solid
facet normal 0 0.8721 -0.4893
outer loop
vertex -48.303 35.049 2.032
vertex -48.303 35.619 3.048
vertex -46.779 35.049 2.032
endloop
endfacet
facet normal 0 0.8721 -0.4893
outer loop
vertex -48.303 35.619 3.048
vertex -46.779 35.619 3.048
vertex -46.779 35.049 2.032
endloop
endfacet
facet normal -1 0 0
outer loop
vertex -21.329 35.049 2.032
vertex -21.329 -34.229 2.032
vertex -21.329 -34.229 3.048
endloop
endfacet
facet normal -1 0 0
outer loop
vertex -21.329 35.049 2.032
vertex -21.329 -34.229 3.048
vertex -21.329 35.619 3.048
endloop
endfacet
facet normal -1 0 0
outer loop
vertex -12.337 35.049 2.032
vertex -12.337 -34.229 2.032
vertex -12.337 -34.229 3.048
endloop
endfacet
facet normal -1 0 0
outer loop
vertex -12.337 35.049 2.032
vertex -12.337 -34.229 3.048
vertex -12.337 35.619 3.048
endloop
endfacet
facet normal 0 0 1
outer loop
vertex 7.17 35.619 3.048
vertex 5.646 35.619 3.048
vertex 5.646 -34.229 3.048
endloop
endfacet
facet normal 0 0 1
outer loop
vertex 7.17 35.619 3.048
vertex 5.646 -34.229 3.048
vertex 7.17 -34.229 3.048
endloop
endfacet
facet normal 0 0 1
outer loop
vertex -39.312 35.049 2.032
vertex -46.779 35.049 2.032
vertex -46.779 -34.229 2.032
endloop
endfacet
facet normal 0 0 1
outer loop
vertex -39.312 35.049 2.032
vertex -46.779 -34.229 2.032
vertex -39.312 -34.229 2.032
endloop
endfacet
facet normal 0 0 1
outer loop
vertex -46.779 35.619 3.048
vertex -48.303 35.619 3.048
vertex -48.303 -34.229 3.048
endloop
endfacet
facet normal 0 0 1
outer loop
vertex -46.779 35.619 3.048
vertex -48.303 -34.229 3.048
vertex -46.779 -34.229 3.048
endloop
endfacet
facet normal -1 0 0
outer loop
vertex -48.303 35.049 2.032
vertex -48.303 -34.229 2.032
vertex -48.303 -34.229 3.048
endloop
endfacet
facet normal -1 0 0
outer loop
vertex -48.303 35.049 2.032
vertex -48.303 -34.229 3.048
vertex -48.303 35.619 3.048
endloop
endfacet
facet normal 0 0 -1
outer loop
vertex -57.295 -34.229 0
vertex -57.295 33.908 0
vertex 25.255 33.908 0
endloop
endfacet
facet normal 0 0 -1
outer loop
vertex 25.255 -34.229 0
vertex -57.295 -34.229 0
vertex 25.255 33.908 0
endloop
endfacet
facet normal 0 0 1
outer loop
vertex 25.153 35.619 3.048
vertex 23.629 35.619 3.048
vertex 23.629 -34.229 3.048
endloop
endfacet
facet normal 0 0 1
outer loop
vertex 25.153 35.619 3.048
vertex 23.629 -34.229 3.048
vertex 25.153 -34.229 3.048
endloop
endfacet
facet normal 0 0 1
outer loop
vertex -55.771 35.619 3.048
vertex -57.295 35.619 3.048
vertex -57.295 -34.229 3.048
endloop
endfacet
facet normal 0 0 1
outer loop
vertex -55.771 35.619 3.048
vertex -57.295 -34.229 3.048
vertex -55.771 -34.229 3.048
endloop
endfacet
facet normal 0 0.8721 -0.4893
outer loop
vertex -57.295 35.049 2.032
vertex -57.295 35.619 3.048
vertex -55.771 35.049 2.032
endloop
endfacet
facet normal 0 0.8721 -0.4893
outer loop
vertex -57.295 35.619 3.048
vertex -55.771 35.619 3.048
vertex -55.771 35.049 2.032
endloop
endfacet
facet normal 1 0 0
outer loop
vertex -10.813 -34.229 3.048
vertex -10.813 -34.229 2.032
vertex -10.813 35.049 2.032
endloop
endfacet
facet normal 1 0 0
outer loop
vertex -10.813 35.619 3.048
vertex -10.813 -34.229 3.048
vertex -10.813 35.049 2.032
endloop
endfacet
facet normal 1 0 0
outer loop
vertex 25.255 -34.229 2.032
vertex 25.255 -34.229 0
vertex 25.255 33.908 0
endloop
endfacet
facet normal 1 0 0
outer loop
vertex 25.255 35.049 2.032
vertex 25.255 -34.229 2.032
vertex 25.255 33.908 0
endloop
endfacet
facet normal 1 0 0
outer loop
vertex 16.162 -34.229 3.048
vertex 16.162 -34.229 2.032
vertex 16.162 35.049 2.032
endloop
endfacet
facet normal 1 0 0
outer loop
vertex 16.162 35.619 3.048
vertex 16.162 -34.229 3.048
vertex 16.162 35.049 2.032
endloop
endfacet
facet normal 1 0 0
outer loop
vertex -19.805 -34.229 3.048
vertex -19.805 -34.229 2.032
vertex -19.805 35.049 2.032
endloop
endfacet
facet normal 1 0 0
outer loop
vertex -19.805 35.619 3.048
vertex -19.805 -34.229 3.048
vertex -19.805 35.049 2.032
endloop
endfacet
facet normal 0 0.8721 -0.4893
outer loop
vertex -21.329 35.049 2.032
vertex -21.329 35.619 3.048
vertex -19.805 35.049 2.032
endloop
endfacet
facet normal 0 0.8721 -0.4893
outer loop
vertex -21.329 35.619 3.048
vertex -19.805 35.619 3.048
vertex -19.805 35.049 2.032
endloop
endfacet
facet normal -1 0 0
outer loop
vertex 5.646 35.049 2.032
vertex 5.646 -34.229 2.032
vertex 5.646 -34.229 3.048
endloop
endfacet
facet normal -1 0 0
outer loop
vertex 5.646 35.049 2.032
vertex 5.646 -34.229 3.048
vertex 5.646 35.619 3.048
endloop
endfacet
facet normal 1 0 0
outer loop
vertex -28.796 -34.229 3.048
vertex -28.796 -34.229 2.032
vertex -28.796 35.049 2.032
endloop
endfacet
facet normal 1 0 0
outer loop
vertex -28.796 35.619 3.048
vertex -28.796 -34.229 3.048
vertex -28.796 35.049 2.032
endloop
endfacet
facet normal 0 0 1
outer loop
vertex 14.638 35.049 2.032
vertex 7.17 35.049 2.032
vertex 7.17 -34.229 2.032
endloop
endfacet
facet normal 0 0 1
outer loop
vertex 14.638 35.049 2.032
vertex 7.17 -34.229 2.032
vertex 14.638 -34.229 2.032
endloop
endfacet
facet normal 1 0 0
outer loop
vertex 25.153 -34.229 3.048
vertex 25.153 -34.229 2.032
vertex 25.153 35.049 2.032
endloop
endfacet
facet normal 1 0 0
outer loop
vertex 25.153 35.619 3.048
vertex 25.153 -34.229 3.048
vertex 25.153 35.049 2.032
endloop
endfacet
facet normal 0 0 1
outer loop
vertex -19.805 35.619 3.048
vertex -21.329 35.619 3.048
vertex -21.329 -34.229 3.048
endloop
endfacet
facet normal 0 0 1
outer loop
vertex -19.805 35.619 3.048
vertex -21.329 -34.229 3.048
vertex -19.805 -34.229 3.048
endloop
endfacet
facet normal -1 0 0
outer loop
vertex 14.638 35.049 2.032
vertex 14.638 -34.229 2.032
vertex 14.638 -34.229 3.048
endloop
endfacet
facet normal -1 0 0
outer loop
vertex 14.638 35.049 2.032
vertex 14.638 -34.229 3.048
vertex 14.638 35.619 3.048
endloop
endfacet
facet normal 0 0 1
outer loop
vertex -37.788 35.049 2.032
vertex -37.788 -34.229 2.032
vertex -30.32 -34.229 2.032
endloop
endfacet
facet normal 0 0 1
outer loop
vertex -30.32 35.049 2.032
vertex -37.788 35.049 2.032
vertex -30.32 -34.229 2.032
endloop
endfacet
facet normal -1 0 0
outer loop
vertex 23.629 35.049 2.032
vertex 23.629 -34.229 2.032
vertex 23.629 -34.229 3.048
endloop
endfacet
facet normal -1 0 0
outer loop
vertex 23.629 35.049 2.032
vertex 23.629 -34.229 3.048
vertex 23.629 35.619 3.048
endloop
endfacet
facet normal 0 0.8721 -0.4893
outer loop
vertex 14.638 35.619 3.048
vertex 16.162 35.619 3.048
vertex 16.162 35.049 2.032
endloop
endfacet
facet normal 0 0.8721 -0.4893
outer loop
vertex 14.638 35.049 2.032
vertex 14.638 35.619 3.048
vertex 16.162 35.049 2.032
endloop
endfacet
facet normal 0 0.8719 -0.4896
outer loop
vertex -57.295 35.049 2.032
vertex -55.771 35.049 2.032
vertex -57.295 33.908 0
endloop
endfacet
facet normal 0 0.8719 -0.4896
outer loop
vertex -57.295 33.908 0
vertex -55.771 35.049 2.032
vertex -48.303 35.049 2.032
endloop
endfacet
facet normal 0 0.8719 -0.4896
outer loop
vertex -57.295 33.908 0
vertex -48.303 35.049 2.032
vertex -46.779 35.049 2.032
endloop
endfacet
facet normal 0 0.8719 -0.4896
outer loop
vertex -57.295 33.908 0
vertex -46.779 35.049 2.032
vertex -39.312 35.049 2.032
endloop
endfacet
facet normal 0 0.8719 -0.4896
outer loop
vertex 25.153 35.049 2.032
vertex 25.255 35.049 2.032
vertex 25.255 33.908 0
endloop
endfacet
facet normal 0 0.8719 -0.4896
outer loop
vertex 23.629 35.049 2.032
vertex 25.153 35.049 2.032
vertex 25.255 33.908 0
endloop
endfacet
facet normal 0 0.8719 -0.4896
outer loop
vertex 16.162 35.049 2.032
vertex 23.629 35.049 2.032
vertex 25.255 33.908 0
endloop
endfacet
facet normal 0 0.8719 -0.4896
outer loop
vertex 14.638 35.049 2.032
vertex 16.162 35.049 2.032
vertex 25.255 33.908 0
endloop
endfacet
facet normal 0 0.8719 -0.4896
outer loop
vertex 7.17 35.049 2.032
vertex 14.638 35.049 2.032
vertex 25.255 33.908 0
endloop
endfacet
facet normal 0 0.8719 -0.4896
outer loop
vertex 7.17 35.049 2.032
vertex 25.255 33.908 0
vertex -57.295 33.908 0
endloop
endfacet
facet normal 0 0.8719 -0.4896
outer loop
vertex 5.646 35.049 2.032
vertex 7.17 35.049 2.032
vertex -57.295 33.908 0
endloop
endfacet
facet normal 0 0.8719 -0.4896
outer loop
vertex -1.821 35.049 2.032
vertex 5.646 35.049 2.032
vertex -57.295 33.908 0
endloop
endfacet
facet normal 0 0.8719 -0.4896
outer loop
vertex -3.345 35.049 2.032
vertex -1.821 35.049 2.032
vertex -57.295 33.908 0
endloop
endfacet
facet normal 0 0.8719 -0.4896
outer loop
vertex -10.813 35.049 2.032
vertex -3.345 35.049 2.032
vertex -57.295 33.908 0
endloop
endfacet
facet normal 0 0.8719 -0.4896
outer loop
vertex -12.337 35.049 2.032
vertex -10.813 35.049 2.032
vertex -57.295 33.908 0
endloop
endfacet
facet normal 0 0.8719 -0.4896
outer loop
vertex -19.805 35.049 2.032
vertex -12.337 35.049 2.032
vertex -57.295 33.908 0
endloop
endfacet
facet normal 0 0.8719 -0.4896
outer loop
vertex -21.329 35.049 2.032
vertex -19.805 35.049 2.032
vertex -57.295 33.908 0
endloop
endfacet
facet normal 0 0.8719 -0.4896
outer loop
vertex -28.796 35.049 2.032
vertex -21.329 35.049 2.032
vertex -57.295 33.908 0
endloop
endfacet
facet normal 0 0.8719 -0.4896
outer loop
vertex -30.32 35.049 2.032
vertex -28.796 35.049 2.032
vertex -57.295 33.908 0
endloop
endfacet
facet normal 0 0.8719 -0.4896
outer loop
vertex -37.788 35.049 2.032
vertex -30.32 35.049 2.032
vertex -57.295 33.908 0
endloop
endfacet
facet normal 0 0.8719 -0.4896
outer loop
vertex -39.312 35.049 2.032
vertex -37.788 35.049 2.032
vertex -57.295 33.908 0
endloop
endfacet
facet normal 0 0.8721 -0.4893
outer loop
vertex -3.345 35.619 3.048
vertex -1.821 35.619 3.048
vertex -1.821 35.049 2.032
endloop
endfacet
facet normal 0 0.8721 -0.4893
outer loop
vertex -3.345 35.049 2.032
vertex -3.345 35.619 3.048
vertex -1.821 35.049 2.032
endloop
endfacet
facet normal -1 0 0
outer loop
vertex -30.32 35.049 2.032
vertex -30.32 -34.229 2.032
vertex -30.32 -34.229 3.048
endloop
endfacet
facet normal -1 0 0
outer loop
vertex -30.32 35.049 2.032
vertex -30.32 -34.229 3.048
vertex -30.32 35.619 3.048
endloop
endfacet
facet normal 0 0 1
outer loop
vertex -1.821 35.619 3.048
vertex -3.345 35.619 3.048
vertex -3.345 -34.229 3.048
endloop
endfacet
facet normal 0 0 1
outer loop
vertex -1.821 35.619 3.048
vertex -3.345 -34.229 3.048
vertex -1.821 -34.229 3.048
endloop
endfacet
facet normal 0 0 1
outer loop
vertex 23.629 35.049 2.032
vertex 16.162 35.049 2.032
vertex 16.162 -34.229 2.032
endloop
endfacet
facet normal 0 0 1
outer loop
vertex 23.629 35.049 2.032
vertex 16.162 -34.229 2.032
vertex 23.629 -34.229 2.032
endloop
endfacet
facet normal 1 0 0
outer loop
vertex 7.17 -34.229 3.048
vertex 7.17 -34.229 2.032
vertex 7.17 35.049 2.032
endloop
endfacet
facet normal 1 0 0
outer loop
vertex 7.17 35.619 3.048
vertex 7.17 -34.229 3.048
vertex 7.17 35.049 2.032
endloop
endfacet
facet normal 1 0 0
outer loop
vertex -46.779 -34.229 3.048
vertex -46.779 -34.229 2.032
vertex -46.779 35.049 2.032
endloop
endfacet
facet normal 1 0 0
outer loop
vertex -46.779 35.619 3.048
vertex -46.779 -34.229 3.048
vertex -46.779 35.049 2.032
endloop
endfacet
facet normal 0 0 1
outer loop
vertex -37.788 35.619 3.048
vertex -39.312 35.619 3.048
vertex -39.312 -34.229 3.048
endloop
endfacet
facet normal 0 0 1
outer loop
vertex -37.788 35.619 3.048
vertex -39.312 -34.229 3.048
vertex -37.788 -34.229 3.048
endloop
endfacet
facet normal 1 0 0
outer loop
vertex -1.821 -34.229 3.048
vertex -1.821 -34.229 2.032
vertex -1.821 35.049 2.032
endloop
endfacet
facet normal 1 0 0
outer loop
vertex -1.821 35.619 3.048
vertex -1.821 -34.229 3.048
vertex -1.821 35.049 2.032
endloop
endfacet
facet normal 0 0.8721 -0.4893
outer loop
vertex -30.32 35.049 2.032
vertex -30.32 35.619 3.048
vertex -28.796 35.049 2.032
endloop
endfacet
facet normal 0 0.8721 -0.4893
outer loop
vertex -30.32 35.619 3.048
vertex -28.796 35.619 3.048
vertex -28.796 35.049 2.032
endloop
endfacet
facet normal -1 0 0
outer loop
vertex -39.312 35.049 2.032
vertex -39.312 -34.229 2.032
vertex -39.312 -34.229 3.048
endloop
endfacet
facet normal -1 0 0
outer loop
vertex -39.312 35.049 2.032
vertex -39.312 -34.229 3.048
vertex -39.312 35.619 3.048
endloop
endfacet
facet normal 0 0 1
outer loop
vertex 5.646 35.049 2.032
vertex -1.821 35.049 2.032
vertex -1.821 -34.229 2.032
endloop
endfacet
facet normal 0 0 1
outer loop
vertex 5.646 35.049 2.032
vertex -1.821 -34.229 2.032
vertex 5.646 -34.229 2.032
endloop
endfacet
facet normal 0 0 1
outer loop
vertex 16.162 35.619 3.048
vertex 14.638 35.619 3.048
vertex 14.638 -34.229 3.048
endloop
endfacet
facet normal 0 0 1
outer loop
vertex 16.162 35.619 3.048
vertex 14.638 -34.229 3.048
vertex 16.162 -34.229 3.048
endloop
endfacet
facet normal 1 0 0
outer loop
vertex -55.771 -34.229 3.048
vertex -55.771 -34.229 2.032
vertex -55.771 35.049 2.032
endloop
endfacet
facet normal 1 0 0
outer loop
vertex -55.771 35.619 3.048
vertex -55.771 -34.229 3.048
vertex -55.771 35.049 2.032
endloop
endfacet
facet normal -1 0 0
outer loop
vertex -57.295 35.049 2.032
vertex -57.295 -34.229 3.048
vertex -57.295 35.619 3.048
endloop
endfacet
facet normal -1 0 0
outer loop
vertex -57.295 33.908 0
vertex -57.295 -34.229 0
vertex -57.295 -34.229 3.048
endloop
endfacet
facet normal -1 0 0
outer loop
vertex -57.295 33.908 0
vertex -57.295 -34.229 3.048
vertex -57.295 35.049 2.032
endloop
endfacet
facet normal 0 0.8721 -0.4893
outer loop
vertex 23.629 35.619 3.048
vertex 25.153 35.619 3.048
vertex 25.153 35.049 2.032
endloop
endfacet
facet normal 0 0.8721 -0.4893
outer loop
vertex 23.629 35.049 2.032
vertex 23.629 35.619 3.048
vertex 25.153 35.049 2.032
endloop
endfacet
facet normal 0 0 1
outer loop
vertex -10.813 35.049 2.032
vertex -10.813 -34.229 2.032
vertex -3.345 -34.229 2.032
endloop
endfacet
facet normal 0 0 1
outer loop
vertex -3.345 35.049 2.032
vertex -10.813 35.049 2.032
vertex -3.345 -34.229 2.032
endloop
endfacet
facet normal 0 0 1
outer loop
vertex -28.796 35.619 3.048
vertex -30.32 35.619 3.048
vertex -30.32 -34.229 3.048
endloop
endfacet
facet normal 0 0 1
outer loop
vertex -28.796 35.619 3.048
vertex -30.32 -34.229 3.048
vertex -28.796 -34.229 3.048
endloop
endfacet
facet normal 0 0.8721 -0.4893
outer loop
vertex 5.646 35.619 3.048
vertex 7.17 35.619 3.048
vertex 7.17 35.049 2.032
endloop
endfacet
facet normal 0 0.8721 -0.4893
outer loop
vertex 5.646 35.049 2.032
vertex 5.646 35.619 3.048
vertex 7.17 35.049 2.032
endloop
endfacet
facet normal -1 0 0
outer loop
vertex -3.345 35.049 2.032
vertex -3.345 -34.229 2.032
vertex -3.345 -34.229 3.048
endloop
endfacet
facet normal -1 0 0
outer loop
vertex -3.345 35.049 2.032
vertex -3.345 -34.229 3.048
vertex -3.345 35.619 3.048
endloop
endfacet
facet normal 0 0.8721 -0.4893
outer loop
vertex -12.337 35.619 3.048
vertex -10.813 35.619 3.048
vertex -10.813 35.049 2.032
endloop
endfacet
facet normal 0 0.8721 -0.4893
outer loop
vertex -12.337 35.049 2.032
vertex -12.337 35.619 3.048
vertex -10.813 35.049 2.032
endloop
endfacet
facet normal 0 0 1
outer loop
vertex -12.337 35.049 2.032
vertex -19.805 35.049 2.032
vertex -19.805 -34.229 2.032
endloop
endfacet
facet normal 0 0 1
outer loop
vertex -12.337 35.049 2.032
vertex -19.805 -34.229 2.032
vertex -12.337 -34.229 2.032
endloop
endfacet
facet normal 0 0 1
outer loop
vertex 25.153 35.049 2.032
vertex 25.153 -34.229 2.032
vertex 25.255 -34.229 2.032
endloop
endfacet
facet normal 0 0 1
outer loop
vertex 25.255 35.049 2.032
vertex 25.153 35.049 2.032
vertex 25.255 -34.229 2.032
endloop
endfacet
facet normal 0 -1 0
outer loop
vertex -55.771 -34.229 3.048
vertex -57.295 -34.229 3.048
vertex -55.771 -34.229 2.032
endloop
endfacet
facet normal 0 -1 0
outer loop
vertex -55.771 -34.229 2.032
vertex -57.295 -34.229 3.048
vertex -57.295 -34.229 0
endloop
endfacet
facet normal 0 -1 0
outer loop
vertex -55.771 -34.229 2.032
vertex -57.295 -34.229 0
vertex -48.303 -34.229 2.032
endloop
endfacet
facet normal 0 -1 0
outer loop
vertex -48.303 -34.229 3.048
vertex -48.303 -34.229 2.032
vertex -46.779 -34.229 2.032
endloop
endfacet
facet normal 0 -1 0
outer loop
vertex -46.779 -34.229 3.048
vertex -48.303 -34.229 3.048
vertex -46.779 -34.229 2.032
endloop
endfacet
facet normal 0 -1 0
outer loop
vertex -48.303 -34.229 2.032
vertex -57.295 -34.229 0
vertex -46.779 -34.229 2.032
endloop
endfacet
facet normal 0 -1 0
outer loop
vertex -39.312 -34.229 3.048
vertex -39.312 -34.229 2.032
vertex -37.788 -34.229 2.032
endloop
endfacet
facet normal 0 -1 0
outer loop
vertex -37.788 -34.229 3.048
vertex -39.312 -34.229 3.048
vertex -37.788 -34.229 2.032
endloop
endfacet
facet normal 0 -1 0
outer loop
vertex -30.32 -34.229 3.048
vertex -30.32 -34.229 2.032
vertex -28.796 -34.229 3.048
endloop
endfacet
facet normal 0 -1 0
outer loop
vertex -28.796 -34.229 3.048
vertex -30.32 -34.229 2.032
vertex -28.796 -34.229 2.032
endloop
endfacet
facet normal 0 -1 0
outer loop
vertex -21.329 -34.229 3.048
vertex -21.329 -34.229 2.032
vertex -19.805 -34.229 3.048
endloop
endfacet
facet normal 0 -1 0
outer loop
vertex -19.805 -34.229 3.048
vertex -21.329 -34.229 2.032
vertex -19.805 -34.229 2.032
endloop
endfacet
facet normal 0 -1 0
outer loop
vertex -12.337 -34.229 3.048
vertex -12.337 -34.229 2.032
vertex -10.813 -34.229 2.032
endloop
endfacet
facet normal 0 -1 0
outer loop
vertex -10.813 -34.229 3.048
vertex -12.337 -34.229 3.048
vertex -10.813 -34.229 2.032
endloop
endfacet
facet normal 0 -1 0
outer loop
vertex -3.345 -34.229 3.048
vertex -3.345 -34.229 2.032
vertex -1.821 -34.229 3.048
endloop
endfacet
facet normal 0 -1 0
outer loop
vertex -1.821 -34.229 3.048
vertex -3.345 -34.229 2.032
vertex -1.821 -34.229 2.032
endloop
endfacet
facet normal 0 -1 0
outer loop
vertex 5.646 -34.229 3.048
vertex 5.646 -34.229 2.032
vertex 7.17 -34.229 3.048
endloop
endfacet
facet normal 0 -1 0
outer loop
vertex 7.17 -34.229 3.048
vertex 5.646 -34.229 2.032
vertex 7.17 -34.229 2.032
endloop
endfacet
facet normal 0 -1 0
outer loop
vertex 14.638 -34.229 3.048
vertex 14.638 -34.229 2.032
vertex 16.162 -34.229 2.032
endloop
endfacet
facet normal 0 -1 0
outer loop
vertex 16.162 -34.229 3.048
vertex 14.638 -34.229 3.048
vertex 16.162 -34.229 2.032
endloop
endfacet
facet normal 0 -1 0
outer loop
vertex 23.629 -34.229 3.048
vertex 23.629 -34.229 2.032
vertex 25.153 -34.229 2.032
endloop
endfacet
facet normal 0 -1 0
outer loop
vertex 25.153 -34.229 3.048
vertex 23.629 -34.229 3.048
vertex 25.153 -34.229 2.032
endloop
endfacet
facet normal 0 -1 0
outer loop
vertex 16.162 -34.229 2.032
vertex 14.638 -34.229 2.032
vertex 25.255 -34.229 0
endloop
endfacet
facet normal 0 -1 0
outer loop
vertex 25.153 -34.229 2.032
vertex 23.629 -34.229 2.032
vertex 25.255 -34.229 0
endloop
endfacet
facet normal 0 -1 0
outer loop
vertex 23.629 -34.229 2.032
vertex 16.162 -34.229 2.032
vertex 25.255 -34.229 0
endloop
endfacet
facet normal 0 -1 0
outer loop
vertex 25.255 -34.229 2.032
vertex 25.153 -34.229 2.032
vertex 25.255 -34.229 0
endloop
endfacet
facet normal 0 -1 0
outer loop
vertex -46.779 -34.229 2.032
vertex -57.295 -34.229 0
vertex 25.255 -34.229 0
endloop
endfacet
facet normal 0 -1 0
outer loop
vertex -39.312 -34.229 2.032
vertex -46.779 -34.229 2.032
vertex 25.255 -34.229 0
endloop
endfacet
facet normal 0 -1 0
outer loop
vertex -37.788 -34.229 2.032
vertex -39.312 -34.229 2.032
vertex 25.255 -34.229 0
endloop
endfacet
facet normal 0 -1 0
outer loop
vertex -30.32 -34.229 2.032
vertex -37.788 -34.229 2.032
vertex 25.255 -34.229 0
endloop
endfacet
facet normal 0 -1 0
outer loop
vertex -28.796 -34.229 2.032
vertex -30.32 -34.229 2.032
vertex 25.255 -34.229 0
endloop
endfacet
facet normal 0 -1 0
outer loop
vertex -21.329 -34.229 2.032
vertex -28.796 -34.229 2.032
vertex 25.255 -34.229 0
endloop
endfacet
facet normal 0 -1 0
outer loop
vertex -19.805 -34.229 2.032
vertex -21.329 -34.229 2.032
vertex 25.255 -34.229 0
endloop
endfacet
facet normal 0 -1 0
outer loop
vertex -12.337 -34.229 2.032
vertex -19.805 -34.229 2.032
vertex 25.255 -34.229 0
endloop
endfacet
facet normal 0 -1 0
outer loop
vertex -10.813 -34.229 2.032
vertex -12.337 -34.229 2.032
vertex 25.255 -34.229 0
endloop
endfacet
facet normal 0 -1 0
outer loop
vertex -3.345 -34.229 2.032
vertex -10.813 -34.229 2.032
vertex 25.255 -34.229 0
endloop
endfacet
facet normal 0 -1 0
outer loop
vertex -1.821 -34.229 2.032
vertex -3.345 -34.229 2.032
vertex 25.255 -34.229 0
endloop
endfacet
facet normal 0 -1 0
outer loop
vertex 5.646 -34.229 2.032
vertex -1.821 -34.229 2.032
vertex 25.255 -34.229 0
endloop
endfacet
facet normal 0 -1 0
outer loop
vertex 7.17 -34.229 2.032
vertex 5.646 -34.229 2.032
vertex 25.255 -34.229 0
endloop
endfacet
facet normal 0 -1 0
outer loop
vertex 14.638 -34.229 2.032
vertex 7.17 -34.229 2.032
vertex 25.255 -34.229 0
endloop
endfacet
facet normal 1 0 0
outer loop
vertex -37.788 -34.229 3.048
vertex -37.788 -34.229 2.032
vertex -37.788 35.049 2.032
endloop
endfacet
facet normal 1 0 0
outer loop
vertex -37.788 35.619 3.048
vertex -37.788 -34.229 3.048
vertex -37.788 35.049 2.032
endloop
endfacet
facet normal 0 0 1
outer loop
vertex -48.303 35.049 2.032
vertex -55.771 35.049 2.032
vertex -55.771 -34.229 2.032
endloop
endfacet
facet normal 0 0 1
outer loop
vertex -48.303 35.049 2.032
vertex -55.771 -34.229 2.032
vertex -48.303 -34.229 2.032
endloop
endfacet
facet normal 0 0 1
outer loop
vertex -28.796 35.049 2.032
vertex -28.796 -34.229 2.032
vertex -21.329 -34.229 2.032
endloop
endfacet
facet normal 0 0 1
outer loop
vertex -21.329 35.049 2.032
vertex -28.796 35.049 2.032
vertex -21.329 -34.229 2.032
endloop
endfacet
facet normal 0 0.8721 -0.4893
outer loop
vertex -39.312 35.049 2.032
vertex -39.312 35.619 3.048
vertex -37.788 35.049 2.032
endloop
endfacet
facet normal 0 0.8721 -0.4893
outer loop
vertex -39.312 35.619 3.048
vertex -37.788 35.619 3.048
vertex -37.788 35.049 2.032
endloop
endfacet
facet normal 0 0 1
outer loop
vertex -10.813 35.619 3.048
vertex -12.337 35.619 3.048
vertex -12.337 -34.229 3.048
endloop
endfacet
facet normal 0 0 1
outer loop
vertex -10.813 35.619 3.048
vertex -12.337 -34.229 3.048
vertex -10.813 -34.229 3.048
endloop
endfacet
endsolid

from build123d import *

# Parameters (mm, degrees)
F0_W     = 82.55
F0_H     = 69.85
F1_DEPTH = 2.032
F2_W     = 1.524
F2_H     = 69.85
F3_DEPTH = 1.016
F5_DEPTH = 88.8746


with BuildPart() as f1:
    # F0 (on Top) → F1 (new body)
    with BuildSketch(Plane.XY):
        with Locations((-16.0199867169, 0.6959252059)):
            Rectangle(F0_W, F0_H)
    extrude(amount=F1_DEPTH)

    # F2 (on face) → F3 (join)
    with BuildSketch(Plane.XY.offset(2.032)):
        with Locations((-56.5329867169, 0.6959252059)):
            Rectangle(F2_W, F2_H)
        with Locations((-47.5413867169, 0.6959252059)):
            Rectangle(F2_W, F2_H)
        with Locations((-38.5497867169, 0.6959252059)):
            Rectangle(F2_W, F2_H)
        with Locations((-29.5581867169, 0.6959252059)):
            Rectangle(F2_W, F2_H)
        with Locations((-20.5665867169, 0.6959252059)):
            Rectangle(F2_W, F2_H)
        with Locations((-11.5749867169, 0.6959252059)):
            Rectangle(F2_W, F2_H)
        with Locations((-2.5833867169, 0.6959252059)):
            Rectangle(F2_W, F2_H)
        with Locations((6.4082132831, 0.6959252059)):
            Rectangle(F2_W, F2_H)
        with Locations((15.3998132831, 0.6959252059)):
            Rectangle(F2_W, F2_H)
        with Locations((24.3914132831, 0.6959252059)):
            Rectangle(F2_W, F2_H)
    extrude(amount=F3_DEPTH)

    # F4 (on face) → F5 (cut)
    with BuildSketch(Plane.YZ.offset(25.2550132831)):
        Polygon((33.9077030866, 0), (33.703327179, -0.3639321658), (35.670414567, -0.3639321658), (35.670414567, 3.138860222), (35.048827404, 2.032), (35.6209252059, 2.032), (35.6209252059, 0), align=None)
        Polygon((35.048827404, 2.032), (33.9077030866, 0), (35.6209252059, 0), (35.6209252059, 2.032), align=None)
    extrude(amount=-F5_DEPTH, mode=Mode.SUBTRACT)


solid = f1.part
